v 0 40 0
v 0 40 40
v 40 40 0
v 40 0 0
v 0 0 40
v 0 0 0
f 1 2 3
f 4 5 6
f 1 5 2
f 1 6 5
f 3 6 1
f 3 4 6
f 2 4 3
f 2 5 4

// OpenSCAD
// Isometric_1.scad
// Produces 3 different views
// Square, Square, Triangle from 3 sides

translate ([0,40,0])
rotate([90, 0, 0])
linear_extrude(40)
    polygon(points=[[0,0],[40, 0],[0, 40]]);
